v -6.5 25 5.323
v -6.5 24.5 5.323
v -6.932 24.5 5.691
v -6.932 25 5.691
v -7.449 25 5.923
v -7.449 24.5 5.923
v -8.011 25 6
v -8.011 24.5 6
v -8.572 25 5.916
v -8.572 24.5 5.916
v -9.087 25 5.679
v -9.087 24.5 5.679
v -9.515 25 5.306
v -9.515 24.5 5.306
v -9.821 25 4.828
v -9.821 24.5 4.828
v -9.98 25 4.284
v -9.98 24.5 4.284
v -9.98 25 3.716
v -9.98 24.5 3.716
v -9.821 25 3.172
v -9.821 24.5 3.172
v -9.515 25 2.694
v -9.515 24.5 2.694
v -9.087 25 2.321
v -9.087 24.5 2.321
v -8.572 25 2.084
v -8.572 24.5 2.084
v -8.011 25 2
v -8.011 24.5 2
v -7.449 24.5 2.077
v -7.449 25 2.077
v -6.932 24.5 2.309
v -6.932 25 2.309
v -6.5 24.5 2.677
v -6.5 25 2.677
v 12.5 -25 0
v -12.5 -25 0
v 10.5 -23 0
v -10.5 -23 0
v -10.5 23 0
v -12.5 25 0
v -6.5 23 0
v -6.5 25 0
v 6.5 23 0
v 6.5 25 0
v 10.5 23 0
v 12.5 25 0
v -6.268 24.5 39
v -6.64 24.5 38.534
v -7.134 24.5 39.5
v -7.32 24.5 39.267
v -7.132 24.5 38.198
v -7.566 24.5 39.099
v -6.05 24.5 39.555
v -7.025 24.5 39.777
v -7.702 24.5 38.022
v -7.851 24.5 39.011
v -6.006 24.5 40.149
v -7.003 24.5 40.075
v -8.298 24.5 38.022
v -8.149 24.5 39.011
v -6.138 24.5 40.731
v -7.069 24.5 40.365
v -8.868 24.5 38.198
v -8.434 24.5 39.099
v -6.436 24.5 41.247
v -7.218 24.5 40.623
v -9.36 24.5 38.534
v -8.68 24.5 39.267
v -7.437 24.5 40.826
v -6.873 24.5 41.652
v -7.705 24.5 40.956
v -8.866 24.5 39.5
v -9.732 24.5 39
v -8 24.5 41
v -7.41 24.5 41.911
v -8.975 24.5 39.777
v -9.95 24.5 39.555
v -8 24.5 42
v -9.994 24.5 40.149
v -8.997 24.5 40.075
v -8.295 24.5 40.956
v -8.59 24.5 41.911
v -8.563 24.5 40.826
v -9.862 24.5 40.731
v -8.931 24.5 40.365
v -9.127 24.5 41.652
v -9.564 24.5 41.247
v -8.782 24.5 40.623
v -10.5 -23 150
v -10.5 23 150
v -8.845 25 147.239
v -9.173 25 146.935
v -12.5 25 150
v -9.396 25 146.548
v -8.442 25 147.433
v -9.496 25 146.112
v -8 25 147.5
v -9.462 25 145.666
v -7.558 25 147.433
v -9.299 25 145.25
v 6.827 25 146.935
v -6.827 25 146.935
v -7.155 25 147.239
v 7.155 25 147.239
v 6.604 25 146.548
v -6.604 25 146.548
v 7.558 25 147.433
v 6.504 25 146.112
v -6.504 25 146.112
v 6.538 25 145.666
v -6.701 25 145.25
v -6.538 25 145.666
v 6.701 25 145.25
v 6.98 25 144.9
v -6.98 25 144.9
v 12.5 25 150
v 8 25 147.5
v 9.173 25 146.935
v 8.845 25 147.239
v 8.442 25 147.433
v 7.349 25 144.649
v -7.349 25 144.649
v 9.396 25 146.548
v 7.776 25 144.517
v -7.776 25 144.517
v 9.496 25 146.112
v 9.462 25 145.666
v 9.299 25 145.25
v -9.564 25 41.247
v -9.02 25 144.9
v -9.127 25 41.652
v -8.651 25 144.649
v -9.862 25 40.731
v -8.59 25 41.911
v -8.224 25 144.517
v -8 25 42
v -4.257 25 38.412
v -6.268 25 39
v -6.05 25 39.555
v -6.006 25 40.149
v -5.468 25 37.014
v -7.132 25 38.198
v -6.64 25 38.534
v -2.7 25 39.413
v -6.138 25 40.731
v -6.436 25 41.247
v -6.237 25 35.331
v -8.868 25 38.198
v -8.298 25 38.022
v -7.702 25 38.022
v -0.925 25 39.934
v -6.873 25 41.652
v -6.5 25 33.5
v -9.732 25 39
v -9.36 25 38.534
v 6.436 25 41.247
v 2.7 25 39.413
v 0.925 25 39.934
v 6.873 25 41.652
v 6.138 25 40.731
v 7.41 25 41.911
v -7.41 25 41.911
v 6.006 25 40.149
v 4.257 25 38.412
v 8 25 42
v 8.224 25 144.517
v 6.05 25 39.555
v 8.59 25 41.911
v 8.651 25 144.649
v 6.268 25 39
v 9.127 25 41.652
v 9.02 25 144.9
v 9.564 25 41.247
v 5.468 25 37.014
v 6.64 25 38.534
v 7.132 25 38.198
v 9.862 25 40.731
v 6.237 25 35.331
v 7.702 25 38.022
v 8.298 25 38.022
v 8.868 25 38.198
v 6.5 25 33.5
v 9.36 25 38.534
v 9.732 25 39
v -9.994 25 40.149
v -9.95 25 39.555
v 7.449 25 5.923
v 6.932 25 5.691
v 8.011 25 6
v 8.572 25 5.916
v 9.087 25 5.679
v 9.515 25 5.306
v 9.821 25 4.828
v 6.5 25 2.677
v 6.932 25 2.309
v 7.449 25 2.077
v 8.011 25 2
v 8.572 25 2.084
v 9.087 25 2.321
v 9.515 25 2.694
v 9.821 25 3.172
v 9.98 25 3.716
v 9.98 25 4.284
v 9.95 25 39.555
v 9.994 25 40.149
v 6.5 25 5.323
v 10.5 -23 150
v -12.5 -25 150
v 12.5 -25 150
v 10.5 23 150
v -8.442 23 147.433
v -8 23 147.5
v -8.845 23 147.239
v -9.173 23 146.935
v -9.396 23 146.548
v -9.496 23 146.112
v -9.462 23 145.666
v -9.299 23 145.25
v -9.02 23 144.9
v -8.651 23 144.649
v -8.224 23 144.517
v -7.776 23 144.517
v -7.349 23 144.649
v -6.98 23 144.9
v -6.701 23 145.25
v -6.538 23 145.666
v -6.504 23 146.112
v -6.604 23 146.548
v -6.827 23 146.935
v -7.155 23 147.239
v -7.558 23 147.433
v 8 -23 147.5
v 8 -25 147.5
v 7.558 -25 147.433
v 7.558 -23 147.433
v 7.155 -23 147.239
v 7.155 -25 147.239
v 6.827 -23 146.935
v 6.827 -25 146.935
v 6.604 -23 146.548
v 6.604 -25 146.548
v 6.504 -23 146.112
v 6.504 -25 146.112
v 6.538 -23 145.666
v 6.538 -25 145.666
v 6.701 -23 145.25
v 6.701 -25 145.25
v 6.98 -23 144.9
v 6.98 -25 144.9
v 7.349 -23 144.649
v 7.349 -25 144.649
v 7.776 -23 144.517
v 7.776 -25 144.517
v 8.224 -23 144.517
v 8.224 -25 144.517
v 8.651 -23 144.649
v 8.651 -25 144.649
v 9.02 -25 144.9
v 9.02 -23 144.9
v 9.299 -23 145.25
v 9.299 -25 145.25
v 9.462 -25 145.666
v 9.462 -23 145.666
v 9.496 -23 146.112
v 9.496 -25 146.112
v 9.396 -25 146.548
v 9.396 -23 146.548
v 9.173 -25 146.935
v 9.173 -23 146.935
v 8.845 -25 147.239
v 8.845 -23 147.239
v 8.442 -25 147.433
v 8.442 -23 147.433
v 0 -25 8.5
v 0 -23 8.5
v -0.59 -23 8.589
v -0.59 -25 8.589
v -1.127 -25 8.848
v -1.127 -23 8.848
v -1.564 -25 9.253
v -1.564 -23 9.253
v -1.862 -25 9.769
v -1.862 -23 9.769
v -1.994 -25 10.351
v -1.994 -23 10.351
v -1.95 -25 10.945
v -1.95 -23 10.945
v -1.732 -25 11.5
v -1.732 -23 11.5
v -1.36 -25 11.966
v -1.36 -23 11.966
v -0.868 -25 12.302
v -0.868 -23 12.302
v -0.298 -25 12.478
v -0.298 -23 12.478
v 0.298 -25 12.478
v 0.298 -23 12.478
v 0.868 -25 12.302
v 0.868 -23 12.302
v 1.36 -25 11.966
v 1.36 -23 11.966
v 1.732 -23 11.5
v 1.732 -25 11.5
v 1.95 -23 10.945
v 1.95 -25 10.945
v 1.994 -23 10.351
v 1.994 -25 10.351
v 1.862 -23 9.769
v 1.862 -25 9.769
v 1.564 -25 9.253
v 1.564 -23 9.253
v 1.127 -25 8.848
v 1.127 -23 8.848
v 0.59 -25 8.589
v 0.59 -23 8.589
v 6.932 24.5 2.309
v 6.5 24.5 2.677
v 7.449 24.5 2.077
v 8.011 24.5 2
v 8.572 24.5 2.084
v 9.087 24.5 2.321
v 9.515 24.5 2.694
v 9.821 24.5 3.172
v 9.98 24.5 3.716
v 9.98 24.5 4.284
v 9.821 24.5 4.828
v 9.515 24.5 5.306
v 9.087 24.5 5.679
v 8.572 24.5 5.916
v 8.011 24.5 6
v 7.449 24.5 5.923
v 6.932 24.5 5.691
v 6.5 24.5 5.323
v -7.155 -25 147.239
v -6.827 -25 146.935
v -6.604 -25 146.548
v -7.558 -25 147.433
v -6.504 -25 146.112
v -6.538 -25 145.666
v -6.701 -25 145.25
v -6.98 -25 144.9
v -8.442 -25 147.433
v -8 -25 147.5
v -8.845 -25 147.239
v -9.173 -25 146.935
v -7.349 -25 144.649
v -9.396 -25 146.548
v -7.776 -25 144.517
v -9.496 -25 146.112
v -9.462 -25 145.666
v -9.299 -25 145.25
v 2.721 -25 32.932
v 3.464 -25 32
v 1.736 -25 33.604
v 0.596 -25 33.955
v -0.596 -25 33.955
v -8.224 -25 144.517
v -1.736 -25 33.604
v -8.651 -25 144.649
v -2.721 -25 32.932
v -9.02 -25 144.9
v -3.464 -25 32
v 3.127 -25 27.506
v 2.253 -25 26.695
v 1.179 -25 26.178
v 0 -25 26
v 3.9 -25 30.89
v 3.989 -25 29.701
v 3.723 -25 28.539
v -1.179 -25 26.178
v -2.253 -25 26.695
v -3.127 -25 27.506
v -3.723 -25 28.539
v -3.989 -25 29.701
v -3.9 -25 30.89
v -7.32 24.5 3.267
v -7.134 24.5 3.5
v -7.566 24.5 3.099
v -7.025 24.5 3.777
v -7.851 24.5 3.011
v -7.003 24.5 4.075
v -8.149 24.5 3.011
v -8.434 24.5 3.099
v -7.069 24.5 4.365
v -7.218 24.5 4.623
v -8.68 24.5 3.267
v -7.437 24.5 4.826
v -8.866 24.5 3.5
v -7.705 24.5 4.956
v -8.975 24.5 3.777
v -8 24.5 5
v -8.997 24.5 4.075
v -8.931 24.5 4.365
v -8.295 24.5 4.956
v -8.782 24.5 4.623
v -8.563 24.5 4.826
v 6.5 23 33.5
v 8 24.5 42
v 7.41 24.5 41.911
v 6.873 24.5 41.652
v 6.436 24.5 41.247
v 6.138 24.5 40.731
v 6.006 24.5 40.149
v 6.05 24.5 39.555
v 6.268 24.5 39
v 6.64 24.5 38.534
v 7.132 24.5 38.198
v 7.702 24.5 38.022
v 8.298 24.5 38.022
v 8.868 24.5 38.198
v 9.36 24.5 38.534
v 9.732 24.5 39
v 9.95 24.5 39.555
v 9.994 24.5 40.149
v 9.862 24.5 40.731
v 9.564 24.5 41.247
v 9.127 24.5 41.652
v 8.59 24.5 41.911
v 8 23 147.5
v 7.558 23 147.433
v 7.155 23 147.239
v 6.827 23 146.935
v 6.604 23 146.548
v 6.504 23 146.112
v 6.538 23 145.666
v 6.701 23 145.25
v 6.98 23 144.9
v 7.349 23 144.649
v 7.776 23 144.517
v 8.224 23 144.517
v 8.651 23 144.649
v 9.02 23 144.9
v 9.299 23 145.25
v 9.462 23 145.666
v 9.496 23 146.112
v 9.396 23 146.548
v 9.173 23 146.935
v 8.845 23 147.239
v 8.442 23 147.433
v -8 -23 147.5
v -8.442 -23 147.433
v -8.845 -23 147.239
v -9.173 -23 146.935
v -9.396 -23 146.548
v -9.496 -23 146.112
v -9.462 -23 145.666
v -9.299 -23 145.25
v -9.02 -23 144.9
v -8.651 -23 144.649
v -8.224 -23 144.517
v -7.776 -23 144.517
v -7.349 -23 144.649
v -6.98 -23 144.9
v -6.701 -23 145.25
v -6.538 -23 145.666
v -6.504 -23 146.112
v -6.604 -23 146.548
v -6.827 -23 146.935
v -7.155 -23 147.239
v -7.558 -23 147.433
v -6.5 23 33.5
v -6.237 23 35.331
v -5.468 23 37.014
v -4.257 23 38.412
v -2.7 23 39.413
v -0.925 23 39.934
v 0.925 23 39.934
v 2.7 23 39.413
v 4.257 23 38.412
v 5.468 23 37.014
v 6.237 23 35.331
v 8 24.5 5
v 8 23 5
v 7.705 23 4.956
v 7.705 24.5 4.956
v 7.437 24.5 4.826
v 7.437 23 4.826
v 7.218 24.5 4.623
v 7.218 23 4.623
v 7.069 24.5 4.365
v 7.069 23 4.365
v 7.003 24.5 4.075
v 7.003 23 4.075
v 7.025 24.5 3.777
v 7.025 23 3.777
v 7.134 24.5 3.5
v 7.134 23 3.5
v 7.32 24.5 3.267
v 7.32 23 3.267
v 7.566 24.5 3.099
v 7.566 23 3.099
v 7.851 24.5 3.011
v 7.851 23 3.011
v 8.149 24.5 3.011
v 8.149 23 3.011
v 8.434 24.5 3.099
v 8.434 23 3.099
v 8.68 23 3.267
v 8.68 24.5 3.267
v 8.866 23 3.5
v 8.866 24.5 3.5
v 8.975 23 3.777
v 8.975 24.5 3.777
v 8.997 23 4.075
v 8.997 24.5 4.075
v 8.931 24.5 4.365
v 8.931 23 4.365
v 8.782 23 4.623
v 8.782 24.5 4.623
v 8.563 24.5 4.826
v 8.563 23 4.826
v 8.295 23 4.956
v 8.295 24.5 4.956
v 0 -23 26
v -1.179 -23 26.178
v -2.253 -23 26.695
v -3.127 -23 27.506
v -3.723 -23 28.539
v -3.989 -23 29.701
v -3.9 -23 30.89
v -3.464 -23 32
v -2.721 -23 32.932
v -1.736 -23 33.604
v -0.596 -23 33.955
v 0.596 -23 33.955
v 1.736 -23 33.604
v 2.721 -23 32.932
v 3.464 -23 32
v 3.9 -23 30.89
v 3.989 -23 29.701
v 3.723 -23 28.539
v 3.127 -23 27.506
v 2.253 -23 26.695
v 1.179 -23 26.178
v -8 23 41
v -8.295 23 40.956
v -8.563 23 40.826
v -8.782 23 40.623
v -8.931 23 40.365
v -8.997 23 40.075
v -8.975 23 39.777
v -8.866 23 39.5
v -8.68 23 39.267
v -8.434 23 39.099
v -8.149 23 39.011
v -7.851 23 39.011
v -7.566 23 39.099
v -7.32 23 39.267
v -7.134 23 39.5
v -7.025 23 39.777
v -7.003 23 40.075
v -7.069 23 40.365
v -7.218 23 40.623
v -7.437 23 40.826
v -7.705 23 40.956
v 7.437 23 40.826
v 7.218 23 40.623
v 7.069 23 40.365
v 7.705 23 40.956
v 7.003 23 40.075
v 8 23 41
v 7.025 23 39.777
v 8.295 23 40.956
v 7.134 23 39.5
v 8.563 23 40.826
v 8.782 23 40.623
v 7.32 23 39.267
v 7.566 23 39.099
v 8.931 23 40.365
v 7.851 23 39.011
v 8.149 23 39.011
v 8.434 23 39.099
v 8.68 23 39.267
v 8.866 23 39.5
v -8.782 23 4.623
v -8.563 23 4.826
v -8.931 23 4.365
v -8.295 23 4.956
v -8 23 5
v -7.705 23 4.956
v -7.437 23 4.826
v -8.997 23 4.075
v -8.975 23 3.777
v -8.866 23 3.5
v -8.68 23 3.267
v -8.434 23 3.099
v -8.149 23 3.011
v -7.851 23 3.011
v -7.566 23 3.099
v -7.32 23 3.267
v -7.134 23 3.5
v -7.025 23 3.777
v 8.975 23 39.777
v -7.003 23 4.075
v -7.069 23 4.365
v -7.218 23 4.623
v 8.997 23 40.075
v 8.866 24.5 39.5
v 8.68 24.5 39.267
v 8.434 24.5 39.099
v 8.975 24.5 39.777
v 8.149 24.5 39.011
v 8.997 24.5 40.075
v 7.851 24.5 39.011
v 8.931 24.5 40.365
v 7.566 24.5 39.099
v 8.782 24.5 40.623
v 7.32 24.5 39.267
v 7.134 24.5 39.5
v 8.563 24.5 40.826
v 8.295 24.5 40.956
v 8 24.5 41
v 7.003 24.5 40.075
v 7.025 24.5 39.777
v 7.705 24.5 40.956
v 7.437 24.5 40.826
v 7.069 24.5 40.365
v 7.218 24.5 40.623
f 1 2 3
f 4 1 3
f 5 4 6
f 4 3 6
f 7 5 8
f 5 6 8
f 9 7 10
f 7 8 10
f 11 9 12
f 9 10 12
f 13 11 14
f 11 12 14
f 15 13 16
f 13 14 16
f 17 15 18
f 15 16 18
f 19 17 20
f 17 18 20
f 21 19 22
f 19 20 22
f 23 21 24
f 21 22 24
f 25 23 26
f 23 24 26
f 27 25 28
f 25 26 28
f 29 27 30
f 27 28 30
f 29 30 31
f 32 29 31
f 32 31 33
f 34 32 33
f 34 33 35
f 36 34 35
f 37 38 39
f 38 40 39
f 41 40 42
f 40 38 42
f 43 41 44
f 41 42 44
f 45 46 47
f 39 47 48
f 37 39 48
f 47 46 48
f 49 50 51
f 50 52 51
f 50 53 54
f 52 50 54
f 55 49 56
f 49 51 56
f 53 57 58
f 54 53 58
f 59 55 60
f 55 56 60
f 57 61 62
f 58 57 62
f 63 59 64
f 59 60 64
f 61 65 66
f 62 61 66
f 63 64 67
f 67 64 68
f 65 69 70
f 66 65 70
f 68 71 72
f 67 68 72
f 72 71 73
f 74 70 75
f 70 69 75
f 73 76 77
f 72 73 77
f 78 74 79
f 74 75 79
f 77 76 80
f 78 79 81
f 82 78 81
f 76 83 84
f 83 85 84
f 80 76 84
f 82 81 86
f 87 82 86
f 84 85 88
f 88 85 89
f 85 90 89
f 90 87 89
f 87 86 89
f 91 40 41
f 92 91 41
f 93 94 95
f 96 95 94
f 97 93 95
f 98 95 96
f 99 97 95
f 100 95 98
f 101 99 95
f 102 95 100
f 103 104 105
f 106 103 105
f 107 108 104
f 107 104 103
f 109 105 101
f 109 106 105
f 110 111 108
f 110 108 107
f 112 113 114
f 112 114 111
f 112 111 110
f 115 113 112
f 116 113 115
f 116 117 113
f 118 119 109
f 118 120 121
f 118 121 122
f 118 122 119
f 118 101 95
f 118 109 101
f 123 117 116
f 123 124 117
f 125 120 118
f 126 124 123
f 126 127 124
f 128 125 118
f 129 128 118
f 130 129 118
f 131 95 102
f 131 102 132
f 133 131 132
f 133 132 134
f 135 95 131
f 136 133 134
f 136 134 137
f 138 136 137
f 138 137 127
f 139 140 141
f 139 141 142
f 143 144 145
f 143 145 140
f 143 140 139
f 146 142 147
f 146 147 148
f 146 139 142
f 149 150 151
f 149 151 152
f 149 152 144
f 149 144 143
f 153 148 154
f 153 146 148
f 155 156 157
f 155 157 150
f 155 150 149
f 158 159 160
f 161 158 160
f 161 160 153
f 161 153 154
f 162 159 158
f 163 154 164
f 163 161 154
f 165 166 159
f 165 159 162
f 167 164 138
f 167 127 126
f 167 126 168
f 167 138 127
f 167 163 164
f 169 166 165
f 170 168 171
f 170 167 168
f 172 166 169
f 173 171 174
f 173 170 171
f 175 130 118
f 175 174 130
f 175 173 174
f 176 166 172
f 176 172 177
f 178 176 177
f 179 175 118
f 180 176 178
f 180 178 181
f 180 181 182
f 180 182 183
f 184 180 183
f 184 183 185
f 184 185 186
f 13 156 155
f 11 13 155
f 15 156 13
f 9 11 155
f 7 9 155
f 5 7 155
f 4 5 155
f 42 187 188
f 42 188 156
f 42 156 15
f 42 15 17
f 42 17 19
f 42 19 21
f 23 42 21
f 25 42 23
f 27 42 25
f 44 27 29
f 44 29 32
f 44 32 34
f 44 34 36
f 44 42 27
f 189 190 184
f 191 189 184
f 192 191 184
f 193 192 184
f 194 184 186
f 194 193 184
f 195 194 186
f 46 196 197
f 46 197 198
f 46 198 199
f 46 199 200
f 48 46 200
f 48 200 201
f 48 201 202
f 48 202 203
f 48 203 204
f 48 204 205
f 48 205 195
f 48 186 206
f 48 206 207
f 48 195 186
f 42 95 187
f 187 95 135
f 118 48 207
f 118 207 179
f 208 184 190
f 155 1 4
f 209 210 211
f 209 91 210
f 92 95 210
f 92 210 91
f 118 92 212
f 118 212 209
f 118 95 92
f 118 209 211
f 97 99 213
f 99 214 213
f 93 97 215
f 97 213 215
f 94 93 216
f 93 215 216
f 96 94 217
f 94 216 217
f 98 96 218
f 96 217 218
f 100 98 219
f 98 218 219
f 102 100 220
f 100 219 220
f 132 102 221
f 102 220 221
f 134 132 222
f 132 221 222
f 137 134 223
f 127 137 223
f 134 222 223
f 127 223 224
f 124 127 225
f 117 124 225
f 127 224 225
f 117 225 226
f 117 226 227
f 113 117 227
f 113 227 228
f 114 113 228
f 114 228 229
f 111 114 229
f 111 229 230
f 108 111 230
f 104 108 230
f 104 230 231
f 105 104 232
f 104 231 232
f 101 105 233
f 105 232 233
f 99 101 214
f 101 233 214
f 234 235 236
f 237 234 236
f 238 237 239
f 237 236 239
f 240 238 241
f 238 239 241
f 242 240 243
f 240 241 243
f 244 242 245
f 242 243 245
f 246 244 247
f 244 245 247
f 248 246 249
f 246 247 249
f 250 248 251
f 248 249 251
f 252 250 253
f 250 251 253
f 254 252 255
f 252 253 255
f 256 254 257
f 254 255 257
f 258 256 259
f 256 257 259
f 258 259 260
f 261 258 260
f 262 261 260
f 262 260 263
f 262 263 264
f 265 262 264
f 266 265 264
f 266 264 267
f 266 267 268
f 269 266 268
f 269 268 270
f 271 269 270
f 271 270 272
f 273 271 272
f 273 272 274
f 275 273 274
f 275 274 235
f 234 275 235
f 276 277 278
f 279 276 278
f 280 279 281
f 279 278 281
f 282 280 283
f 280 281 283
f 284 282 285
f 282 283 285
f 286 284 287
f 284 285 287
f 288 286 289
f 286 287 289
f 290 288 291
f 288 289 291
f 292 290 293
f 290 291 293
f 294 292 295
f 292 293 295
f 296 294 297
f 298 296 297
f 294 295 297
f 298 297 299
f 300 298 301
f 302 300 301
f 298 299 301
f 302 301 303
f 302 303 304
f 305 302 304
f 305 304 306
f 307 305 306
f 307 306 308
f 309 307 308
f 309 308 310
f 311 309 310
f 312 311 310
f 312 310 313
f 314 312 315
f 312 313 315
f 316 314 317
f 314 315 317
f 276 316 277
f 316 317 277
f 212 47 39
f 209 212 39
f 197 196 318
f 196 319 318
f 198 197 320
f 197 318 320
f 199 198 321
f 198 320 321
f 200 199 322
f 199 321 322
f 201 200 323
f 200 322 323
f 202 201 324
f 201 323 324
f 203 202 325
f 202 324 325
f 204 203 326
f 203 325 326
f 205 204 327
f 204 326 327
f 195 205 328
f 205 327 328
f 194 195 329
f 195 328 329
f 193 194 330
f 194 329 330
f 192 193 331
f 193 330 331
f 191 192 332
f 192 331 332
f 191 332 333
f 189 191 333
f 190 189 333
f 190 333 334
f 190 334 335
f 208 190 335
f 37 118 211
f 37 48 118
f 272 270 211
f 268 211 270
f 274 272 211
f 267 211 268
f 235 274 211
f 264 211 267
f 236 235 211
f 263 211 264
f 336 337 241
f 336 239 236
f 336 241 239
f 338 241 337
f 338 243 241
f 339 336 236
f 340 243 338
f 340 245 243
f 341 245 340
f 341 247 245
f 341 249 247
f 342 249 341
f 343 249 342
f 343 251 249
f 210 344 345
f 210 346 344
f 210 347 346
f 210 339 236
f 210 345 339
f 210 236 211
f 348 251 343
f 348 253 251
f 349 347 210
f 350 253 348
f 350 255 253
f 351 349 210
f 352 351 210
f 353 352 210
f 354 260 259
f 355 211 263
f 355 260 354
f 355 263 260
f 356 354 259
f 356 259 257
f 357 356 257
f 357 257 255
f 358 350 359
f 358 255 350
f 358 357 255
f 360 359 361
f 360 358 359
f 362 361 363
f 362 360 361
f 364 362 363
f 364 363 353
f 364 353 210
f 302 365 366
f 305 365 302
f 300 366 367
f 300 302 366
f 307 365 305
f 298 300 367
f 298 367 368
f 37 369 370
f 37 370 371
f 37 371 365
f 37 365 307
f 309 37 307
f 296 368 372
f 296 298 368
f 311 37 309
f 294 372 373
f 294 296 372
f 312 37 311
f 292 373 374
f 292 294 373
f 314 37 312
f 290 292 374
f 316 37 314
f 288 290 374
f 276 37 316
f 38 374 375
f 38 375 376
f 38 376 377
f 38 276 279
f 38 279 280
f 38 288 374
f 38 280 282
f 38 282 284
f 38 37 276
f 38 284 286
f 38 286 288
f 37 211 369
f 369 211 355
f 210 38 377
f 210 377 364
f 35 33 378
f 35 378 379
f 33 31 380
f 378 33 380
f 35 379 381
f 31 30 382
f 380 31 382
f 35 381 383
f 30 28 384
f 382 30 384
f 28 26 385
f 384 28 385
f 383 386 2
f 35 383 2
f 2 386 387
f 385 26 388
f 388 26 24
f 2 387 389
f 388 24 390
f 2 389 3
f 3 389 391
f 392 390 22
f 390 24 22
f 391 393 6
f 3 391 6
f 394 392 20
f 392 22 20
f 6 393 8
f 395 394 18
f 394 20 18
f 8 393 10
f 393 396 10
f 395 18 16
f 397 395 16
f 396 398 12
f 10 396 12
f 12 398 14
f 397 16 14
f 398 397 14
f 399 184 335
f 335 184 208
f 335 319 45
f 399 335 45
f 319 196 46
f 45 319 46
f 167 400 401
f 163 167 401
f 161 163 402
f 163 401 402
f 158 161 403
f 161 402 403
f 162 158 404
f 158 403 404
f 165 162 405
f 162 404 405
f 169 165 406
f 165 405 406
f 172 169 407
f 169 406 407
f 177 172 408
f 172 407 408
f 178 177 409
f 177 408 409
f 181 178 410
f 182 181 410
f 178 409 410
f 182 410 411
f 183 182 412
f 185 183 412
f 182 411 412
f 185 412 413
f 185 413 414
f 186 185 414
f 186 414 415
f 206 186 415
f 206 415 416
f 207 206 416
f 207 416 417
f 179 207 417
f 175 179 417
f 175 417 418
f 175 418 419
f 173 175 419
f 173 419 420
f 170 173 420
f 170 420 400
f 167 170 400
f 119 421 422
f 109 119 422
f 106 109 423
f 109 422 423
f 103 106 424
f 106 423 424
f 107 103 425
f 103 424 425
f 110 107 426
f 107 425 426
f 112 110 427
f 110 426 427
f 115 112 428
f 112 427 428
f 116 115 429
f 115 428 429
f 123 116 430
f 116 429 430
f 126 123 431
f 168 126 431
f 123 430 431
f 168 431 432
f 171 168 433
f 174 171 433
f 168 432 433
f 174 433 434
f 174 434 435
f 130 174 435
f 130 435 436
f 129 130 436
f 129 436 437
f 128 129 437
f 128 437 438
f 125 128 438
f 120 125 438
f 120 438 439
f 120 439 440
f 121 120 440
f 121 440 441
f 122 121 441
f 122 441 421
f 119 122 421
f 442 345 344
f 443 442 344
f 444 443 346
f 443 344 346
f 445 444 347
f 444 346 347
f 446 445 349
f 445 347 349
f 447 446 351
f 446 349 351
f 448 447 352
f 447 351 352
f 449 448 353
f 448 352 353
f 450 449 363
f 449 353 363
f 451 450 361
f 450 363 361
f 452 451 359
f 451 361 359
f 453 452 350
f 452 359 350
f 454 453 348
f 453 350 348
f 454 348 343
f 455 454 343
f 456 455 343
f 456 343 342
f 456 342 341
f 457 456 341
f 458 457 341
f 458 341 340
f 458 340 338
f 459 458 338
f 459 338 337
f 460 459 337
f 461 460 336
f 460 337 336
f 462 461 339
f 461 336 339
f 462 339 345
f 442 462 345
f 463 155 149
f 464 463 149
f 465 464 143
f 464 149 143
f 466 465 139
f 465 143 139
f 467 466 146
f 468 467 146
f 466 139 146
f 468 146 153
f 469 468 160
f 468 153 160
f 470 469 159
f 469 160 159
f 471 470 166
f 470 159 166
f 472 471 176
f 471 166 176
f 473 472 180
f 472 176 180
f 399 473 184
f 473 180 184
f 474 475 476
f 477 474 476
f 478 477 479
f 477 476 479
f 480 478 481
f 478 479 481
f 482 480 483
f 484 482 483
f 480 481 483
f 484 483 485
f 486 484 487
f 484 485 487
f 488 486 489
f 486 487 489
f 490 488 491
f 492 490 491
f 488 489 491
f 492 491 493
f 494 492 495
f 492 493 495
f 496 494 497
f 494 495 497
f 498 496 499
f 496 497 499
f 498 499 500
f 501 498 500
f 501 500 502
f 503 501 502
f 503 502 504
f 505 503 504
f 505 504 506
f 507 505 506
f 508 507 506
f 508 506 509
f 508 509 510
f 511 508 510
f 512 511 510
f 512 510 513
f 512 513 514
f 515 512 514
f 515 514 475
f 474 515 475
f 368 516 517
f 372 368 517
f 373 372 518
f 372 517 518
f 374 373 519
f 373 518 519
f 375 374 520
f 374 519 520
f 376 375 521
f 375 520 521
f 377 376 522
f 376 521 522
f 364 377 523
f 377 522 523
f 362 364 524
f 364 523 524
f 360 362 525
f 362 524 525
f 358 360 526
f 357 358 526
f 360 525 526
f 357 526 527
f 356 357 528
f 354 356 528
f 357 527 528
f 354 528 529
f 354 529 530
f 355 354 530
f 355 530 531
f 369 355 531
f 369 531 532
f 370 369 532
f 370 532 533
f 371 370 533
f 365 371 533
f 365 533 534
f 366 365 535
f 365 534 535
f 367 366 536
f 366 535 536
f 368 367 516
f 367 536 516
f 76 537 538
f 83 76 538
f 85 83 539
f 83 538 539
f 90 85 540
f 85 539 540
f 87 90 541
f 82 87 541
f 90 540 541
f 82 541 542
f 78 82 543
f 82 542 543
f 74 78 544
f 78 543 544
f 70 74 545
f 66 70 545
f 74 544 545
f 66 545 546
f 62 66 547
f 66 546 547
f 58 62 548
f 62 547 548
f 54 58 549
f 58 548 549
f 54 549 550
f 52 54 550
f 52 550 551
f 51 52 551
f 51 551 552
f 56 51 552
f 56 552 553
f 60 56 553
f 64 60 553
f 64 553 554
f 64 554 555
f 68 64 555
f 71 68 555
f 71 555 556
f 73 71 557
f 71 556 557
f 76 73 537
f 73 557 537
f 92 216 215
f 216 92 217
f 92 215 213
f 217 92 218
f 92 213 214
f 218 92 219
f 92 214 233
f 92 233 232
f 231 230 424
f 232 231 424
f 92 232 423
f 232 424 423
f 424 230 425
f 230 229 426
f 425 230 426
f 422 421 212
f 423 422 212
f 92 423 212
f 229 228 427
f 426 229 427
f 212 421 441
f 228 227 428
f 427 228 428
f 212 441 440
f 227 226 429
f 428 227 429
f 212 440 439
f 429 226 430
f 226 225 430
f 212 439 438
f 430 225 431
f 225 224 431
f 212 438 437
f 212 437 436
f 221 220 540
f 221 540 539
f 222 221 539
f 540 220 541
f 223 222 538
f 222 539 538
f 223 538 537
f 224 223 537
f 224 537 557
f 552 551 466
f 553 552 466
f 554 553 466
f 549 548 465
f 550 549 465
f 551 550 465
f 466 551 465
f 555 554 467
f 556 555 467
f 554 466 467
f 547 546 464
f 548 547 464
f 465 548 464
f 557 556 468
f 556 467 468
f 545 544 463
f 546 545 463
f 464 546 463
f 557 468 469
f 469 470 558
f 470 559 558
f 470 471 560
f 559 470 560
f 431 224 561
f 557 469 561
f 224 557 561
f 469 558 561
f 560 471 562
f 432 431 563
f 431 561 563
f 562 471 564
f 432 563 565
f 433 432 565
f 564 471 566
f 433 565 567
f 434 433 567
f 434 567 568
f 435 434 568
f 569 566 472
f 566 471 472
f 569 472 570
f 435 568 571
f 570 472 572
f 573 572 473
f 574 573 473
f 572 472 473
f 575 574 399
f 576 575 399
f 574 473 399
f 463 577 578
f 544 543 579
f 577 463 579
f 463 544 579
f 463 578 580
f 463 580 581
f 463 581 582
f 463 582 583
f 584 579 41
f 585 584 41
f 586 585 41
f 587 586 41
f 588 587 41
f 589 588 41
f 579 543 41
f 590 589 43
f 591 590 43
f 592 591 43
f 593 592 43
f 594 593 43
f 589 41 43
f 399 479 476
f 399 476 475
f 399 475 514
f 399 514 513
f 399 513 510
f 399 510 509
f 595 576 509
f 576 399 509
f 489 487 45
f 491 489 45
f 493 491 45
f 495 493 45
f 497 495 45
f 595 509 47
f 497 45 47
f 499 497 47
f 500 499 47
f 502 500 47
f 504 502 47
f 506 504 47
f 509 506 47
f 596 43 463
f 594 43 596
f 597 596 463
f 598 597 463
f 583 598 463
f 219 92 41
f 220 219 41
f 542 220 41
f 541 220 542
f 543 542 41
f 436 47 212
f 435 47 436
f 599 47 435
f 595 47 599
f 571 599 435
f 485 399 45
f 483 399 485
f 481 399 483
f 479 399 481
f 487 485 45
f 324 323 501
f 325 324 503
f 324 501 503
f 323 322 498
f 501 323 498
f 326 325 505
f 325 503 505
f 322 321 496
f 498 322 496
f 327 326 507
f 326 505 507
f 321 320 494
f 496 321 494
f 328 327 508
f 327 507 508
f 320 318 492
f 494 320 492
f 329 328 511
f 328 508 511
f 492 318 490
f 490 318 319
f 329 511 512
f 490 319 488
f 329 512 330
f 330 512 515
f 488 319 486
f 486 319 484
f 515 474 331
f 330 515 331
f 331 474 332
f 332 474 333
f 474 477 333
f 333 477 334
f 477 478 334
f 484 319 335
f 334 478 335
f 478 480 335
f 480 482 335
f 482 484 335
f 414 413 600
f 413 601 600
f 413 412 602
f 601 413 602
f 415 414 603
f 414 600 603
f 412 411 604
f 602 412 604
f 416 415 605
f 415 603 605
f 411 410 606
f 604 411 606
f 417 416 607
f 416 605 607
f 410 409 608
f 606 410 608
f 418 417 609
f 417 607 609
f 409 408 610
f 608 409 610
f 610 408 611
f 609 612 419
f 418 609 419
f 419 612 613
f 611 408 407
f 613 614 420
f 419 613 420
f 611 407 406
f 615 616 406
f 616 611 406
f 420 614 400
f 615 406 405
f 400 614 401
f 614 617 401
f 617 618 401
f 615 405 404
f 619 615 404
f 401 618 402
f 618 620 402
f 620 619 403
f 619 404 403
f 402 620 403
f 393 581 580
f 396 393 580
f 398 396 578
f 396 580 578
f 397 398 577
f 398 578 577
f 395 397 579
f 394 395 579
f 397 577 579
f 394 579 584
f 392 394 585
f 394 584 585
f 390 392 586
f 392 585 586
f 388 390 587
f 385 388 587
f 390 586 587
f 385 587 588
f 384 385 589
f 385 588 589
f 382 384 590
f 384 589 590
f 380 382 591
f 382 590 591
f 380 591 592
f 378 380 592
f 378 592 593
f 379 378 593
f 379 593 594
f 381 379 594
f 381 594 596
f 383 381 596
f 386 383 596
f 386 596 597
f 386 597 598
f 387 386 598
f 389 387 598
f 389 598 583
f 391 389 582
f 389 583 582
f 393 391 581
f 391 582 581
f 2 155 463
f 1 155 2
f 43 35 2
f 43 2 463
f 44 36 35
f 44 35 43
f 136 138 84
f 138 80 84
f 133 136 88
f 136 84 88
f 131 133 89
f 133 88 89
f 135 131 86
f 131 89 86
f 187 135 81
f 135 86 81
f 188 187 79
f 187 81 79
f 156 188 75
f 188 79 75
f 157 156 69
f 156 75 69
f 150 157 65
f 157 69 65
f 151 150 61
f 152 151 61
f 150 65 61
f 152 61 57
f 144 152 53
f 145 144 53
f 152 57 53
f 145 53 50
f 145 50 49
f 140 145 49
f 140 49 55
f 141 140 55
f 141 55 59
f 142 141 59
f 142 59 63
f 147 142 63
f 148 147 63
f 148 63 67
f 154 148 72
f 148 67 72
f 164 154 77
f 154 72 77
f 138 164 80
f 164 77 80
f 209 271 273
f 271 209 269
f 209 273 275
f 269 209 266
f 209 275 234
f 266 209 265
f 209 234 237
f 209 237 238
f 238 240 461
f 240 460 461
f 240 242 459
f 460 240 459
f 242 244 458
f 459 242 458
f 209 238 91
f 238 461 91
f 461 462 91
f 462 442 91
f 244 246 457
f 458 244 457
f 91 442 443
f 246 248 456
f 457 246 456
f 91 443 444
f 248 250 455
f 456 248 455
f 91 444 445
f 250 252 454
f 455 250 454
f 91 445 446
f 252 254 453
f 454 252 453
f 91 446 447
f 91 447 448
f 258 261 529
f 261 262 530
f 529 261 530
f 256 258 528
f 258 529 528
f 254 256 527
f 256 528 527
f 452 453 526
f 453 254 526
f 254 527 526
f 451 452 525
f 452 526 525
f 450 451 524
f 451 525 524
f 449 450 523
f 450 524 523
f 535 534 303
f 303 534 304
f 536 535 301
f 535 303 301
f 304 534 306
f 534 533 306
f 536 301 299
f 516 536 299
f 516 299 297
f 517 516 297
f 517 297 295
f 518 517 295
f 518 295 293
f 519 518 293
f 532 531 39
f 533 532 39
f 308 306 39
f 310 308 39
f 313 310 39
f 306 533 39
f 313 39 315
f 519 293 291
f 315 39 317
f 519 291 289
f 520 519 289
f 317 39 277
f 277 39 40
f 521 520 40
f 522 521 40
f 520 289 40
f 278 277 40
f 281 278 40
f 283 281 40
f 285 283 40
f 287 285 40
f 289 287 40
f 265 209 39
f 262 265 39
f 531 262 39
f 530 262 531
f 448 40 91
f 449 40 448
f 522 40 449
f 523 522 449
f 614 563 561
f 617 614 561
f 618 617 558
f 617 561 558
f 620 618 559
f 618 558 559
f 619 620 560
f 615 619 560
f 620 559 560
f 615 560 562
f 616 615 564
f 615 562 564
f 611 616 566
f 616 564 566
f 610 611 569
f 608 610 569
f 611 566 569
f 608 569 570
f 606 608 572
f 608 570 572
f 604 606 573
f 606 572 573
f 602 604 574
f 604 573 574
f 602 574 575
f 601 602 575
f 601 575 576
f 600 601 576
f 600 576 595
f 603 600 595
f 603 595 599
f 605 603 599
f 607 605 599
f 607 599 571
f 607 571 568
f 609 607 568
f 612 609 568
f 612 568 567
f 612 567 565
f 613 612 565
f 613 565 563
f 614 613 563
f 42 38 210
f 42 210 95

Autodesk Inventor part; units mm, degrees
ref_plane "YZ Plane" through (0, 0, 0) normal (1, 0, 0) x (0, 1, 0)
ref_plane "XZ Plane" through (0, 0, 0) normal (0, 1, 0) x (-1, 0, 0)
ref_plane "XY Plane" through (0, 0, 0) normal (0, 0, 1) x (1, 0, 0)
sketch "スケッチ1" plane through (0, 0, 0) normal (0, 0, 1) x (1, 0, 0)
  line L0 (-12.5, 25) -> (12.5, 25)
  line L1 (12.5, 25) -> (12.5, -25)
  line L2 (12.5, -25) -> (-12.5, -25)
  line L3 (-12.5, -25) -> (-12.5, 25)
  line L4 (-10.5, 23) -> (10.5, 23)
  line L5 (10.5, 23) -> (10.5, -23)
  line L6 (10.5, -23) -> (-10.5, -23)
  line L7 (-10.5, -23) -> (-10.5, 23)
  point P0 (0, 0)
  dimension "d0" = 25
  dimension "d1" = 50
  dimension "d2" = 46
  dimension "d3" = 21
  dimension "d4" = 25
  dimension "d5" = 23
  dimension "d6" = 10.5
  dimension "d7" = 12.5
extrude "押し出し1" add sketch "スケッチ1" along normal blind 150
sketch "スケッチ2" plane through (-12.5, 25, 0) normal (0, 1, 0) x (1, 0, 0)
  line L0 (0, 0) -> (25, 0) projected
  line L1 (0, 0) -> (0, -150) projected
  arc A0 (6, -33.5) -> (19, -33.5) centre (12.5, -33.5) ccw
  line L2 (6, -33.5) -> (6, 0)
  line L3 (19, -33.5) -> (19, 0)
  point P0 (12.5, 0)
  dimension "d10" = 13
  dimension "d11" = 33.5
  dimension "d12" = 12.5
extrude "押し出し2" cut sketch "スケッチ2" against normal blind 2
sketch "スケッチ3" plane through (-12.5, 25, 150) normal (0, 1, 0) x (1, 0, 0)
  arc A0 (6, 116.5) -> (19, 116.5) centre (12.5, 116.5) ccw projected
  circle A1 centre (4.5, 110) radius 1
  circle A2 centre (4.5, 146) radius 1
  circle A3 centre (20.5, 146) radius 1
  circle A4 centre (20.5, 110) radius 1
  point P0 (12.5, 150)
  dimension "d15" = 6.5
  dimension "d16" = 6.5
  dimension "d17" = 2
  dimension "d18" = 8
  dimension "d19" = 8
  dimension "d20" = 8
  dimension "d21" = 8
  dimension "d22" = 29.5
  dimension "d23" = 29.5
hole "穴1" at (-8, 25, 4) at (8, 25, 4) at (8, 25, 40) at (-8, 25, 40) direction (0, -1, 0) diameter 2 depth 2 tip angle 118 counterbore diameter 4 counterbore depth 0.5
sketch "スケッチ4" plane through (-12.5, -25, 0) normal (0, -1, 0) x (1, 0, 0)
  line L0 (25, 0) -> (0, 0) projected
  line L1 (25, 0) -> (25, 150) projected
  circle A0 centre (12.5, 10.5) radius 2
  point P0 (12.5, 0)
  dimension "d31" = 4
  dimension "d32" = 12.5
  dimension "d33" = 10.5
hole "穴2" at (0, -25, 10.5) direction (0, 1, 0) diameter 4 end through all
sketch "スケッチ5" plane through (-12.5, 25, 150) normal (0, 1, 0) x (1, 0, 0)
  line L0 (0, 0) -> (25, 0) projected
  arc A0 (6, 116.5) -> (19, 116.5) centre (12.5, 116.5) ccw projected
  circle A1 centre (20.5, 4) radius 1.5
  circle A2 centre (4.5, 4) radius 1.5
  point P0 (12.5, 150)
  dimension "d43" = 4
  dimension "d44" = 4
  dimension "d46" = 8
  dimension "d47" = 8
  dimension "d57" = 3
hole "穴4" at (-8, 25, 146) at (8, 25, 146) direction (0, -1, 0) diameter 3 end through all
thread "ねじ1" size "M3x0.5" class "6H" standard "ANSI Metric M Profile" full length
thread "ねじ2" size "M3x0.5" class "6H" standard "ANSI Metric M Profile" full length
thread "ねじ3" size "M3x0.5" class "6H" standard "ANSI Metric M Profile" full length
thread "ねじ4" size "M3x0.5" class "6H" standard "ANSI Metric M Profile" full length
sketch "スケッチ7" plane through (-12.5, -25, 0) normal (0, -1, 0) x (1, 0, 0)
  line L0 (25, 0) -> (25, 150) projected
  circle A0 centre (12.5, 30) radius 4
  line L1 (25, 0) -> (0, 0) projected
  point P0 (12.5, 0)
  dimension "d79" = 8
  dimension "d80" = 12.5
  dimension "d88" = 30
hole "穴5" at (0, -25, 30) direction (0, 1, 0) diameter 8 end through all
properties part number "07" material "アルミニウム 6061"
